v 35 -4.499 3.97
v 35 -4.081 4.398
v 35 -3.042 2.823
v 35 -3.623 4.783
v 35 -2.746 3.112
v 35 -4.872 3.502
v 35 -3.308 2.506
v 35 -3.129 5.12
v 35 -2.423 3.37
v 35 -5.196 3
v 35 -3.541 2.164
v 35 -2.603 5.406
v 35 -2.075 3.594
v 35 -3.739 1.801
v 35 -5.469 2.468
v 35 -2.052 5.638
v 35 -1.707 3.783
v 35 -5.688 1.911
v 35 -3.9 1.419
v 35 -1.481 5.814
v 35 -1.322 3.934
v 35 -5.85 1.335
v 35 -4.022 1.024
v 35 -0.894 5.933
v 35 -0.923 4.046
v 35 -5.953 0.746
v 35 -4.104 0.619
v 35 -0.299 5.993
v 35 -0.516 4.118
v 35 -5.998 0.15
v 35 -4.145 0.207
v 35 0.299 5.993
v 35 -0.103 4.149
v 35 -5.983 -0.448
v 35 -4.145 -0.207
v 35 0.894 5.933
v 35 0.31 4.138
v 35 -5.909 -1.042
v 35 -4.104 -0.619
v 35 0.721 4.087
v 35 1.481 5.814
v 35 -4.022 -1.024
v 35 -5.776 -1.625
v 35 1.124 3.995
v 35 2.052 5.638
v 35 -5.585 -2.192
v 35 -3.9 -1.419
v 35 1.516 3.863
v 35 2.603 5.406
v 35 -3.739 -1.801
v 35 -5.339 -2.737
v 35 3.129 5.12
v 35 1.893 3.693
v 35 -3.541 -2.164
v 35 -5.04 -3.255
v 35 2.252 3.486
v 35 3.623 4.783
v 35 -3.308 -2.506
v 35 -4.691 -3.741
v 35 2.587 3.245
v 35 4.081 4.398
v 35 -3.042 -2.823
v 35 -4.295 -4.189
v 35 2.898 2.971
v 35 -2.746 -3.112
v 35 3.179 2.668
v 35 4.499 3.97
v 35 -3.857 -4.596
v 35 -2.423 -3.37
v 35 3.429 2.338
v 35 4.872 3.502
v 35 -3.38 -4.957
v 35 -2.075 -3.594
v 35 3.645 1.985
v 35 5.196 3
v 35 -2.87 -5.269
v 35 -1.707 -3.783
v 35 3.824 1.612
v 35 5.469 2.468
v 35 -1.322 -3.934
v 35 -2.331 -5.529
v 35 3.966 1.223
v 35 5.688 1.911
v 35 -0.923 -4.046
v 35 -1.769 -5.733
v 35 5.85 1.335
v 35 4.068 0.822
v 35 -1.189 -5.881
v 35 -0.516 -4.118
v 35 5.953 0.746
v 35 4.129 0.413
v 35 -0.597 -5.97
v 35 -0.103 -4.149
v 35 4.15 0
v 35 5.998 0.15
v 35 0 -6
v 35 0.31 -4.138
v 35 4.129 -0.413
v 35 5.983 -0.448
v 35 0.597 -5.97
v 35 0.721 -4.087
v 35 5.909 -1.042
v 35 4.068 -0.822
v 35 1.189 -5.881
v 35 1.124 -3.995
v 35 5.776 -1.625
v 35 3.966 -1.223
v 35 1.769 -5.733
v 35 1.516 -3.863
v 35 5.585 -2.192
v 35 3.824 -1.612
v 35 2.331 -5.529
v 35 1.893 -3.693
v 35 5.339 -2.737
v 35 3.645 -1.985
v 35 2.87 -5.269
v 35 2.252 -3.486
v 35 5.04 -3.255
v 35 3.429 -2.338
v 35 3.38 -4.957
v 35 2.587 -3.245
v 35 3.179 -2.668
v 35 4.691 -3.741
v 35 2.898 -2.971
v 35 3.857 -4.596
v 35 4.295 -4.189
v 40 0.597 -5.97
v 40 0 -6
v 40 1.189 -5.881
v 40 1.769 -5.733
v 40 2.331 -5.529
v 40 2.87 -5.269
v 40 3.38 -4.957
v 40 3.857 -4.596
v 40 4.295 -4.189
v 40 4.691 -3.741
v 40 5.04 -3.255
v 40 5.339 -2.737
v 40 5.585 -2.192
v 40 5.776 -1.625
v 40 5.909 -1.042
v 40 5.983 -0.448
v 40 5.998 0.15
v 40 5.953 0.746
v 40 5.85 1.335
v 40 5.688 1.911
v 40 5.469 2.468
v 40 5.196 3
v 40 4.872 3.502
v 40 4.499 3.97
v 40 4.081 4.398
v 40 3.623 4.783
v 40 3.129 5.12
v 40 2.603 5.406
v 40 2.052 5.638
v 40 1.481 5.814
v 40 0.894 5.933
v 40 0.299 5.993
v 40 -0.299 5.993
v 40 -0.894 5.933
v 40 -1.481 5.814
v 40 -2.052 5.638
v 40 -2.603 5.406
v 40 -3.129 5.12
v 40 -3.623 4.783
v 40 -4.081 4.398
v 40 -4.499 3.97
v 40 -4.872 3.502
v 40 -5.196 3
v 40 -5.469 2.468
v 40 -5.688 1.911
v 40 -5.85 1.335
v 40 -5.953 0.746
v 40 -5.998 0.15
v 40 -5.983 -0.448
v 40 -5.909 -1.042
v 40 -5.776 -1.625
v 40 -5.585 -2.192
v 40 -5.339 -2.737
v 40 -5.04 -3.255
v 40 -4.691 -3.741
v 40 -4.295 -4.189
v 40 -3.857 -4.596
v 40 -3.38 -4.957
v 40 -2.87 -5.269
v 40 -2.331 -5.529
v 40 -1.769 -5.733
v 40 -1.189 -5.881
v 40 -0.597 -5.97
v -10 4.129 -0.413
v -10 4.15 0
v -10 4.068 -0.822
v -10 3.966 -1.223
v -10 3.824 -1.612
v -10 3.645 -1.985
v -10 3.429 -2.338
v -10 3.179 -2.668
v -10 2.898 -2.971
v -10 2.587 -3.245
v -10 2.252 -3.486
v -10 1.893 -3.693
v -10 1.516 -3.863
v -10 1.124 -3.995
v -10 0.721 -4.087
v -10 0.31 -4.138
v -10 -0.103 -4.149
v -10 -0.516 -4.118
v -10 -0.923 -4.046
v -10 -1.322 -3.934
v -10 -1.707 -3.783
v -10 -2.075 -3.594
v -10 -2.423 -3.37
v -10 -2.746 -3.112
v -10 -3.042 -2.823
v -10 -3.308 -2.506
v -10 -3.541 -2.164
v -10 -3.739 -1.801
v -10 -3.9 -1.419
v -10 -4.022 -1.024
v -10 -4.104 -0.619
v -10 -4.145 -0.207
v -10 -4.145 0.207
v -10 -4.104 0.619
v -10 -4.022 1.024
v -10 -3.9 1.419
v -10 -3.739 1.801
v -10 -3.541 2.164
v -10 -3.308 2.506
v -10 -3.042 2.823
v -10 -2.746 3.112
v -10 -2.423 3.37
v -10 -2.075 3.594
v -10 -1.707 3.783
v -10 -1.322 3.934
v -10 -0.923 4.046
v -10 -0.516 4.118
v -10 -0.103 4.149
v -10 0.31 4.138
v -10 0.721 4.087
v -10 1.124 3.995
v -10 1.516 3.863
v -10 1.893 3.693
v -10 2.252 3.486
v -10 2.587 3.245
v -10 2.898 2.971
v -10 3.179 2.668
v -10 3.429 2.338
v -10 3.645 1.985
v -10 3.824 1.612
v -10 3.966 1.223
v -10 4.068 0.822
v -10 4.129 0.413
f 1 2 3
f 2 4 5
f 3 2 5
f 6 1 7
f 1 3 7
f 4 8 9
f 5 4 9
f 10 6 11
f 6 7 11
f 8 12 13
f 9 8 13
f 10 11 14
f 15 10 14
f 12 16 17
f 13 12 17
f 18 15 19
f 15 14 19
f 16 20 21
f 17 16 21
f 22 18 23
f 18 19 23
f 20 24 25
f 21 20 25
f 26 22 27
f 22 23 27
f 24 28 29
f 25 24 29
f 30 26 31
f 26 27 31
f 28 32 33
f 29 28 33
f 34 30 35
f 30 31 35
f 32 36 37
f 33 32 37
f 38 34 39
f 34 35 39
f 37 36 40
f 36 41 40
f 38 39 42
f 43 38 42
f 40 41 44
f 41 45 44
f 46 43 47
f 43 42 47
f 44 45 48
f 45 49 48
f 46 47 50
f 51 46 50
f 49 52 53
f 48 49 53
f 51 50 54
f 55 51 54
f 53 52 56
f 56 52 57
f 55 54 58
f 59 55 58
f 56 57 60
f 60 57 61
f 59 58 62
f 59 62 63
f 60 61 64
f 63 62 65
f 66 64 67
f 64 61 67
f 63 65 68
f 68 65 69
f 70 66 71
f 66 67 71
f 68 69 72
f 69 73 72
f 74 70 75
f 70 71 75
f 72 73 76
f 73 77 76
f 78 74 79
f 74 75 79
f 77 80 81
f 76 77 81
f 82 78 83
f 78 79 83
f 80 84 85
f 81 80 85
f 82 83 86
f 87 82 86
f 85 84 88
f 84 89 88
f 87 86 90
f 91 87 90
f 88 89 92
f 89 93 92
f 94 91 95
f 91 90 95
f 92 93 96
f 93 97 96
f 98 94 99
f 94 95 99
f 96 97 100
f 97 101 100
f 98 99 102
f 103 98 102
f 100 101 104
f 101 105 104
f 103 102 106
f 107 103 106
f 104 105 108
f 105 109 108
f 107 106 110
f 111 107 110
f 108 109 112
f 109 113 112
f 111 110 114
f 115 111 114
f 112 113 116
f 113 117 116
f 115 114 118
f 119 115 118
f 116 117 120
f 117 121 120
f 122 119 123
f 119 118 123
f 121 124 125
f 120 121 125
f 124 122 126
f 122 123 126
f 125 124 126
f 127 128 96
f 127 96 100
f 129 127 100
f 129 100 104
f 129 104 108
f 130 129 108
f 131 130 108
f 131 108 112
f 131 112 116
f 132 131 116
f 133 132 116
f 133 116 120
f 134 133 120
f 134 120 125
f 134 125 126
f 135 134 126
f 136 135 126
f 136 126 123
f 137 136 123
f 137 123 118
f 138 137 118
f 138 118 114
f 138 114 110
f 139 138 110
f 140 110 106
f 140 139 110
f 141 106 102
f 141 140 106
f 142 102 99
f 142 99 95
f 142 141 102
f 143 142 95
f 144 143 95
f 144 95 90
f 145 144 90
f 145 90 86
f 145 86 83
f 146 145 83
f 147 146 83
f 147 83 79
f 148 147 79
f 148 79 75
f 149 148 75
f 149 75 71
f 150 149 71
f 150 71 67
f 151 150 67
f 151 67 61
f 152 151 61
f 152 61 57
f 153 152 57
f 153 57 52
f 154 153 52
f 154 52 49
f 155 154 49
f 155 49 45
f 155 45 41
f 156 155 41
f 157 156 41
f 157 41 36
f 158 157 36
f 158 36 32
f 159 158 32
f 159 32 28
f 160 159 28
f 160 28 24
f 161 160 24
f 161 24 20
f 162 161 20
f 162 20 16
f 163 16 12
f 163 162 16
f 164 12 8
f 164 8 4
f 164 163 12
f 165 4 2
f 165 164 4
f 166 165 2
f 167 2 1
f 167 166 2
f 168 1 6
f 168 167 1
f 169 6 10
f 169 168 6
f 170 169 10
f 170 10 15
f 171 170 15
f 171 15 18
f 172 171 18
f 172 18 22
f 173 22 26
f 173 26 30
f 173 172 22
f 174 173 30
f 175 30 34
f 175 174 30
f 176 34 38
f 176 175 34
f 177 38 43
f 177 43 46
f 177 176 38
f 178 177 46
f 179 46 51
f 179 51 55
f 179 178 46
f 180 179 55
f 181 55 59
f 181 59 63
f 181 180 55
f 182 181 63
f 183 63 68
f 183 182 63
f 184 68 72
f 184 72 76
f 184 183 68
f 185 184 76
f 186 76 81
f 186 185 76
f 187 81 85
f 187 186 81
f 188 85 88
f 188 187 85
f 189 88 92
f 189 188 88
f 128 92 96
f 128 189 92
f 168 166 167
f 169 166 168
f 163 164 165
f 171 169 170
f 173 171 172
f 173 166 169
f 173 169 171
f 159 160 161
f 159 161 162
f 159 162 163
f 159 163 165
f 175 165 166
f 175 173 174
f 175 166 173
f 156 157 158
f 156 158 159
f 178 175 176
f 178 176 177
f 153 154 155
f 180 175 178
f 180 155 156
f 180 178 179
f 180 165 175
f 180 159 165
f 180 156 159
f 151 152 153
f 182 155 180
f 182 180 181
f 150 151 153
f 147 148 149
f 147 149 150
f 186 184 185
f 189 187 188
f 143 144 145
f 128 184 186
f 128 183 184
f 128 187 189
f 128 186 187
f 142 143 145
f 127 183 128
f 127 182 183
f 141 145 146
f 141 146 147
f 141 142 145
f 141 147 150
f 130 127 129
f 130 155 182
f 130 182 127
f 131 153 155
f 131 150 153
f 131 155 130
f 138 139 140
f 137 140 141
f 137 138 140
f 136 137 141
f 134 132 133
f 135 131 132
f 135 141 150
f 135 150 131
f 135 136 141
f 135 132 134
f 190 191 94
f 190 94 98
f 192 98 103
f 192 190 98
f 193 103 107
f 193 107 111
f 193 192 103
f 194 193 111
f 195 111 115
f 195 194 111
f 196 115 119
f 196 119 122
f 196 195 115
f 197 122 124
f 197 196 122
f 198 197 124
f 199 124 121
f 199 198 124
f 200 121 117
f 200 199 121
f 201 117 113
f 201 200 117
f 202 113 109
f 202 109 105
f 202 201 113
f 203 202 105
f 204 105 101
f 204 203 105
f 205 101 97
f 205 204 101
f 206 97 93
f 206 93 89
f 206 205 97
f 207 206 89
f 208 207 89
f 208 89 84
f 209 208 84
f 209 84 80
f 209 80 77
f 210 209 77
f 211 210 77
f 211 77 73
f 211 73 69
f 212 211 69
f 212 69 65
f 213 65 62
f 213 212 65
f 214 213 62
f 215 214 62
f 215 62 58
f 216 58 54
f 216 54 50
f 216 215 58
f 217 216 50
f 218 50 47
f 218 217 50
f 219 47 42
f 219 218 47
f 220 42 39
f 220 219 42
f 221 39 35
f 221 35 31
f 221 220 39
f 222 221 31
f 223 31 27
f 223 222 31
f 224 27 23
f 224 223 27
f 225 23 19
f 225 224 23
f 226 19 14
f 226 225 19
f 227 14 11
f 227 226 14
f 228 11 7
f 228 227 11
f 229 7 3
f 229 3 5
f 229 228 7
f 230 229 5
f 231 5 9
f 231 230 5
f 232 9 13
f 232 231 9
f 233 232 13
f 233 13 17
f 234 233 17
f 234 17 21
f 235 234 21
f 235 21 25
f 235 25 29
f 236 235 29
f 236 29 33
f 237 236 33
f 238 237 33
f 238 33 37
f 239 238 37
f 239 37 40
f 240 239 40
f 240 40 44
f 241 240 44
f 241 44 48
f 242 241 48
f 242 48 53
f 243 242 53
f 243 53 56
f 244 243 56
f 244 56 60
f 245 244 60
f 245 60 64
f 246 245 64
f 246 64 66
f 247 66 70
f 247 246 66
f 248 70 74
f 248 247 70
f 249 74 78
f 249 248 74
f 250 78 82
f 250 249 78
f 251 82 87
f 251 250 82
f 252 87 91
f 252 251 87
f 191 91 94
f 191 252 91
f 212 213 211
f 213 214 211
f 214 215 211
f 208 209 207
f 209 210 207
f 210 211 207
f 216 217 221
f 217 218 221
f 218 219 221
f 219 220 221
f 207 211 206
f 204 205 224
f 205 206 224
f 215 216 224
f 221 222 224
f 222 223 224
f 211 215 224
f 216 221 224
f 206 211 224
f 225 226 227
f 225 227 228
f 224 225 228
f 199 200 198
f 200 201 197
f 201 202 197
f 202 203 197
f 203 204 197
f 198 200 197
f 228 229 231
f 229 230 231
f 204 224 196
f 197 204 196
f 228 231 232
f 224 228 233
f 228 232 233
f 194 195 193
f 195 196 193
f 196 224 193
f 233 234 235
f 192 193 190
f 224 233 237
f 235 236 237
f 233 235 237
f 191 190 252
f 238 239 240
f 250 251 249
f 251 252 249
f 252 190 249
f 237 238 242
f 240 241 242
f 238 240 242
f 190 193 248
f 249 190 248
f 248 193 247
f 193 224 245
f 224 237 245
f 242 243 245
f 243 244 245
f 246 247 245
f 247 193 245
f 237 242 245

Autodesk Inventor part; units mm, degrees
ref_plane "YZ Plane" through (0, 0, 0) normal (1, 0, 0) x (0, 1, 0)
ref_plane "XZ Plane" through (0, 0, 0) normal (0, 1, 0) x (-1, 0, 0)
ref_plane "XY Plane" through (0, 0, 0) normal (0, 0, 1) x (1, 0, 0)
sketch "Sketch1" plane through (0, 0, 0) normal (1, 0, 0) x (0, 1, 0)
  circle A0 centre (0, 0) radius 4.15
  dimension "d0" = 8.3
extrude "Extrusion1" add sketch "Sketch1" along normal blind 40
sketch "Sketch2" plane through (40, 0, 0) normal (1, 0, 0) x (0, 0, -1)
  circle A0 centre (0, 0) radius 6
extrude "Extrusion2" add sketch "Sketch2" against normal blind 5
thicken "Thicken1" operation add thickness 10 both sides no extend neighbours yes toward (-1, 0, 0) faces at (0, 1.0354, 0.9173)
properties part number "pin"
